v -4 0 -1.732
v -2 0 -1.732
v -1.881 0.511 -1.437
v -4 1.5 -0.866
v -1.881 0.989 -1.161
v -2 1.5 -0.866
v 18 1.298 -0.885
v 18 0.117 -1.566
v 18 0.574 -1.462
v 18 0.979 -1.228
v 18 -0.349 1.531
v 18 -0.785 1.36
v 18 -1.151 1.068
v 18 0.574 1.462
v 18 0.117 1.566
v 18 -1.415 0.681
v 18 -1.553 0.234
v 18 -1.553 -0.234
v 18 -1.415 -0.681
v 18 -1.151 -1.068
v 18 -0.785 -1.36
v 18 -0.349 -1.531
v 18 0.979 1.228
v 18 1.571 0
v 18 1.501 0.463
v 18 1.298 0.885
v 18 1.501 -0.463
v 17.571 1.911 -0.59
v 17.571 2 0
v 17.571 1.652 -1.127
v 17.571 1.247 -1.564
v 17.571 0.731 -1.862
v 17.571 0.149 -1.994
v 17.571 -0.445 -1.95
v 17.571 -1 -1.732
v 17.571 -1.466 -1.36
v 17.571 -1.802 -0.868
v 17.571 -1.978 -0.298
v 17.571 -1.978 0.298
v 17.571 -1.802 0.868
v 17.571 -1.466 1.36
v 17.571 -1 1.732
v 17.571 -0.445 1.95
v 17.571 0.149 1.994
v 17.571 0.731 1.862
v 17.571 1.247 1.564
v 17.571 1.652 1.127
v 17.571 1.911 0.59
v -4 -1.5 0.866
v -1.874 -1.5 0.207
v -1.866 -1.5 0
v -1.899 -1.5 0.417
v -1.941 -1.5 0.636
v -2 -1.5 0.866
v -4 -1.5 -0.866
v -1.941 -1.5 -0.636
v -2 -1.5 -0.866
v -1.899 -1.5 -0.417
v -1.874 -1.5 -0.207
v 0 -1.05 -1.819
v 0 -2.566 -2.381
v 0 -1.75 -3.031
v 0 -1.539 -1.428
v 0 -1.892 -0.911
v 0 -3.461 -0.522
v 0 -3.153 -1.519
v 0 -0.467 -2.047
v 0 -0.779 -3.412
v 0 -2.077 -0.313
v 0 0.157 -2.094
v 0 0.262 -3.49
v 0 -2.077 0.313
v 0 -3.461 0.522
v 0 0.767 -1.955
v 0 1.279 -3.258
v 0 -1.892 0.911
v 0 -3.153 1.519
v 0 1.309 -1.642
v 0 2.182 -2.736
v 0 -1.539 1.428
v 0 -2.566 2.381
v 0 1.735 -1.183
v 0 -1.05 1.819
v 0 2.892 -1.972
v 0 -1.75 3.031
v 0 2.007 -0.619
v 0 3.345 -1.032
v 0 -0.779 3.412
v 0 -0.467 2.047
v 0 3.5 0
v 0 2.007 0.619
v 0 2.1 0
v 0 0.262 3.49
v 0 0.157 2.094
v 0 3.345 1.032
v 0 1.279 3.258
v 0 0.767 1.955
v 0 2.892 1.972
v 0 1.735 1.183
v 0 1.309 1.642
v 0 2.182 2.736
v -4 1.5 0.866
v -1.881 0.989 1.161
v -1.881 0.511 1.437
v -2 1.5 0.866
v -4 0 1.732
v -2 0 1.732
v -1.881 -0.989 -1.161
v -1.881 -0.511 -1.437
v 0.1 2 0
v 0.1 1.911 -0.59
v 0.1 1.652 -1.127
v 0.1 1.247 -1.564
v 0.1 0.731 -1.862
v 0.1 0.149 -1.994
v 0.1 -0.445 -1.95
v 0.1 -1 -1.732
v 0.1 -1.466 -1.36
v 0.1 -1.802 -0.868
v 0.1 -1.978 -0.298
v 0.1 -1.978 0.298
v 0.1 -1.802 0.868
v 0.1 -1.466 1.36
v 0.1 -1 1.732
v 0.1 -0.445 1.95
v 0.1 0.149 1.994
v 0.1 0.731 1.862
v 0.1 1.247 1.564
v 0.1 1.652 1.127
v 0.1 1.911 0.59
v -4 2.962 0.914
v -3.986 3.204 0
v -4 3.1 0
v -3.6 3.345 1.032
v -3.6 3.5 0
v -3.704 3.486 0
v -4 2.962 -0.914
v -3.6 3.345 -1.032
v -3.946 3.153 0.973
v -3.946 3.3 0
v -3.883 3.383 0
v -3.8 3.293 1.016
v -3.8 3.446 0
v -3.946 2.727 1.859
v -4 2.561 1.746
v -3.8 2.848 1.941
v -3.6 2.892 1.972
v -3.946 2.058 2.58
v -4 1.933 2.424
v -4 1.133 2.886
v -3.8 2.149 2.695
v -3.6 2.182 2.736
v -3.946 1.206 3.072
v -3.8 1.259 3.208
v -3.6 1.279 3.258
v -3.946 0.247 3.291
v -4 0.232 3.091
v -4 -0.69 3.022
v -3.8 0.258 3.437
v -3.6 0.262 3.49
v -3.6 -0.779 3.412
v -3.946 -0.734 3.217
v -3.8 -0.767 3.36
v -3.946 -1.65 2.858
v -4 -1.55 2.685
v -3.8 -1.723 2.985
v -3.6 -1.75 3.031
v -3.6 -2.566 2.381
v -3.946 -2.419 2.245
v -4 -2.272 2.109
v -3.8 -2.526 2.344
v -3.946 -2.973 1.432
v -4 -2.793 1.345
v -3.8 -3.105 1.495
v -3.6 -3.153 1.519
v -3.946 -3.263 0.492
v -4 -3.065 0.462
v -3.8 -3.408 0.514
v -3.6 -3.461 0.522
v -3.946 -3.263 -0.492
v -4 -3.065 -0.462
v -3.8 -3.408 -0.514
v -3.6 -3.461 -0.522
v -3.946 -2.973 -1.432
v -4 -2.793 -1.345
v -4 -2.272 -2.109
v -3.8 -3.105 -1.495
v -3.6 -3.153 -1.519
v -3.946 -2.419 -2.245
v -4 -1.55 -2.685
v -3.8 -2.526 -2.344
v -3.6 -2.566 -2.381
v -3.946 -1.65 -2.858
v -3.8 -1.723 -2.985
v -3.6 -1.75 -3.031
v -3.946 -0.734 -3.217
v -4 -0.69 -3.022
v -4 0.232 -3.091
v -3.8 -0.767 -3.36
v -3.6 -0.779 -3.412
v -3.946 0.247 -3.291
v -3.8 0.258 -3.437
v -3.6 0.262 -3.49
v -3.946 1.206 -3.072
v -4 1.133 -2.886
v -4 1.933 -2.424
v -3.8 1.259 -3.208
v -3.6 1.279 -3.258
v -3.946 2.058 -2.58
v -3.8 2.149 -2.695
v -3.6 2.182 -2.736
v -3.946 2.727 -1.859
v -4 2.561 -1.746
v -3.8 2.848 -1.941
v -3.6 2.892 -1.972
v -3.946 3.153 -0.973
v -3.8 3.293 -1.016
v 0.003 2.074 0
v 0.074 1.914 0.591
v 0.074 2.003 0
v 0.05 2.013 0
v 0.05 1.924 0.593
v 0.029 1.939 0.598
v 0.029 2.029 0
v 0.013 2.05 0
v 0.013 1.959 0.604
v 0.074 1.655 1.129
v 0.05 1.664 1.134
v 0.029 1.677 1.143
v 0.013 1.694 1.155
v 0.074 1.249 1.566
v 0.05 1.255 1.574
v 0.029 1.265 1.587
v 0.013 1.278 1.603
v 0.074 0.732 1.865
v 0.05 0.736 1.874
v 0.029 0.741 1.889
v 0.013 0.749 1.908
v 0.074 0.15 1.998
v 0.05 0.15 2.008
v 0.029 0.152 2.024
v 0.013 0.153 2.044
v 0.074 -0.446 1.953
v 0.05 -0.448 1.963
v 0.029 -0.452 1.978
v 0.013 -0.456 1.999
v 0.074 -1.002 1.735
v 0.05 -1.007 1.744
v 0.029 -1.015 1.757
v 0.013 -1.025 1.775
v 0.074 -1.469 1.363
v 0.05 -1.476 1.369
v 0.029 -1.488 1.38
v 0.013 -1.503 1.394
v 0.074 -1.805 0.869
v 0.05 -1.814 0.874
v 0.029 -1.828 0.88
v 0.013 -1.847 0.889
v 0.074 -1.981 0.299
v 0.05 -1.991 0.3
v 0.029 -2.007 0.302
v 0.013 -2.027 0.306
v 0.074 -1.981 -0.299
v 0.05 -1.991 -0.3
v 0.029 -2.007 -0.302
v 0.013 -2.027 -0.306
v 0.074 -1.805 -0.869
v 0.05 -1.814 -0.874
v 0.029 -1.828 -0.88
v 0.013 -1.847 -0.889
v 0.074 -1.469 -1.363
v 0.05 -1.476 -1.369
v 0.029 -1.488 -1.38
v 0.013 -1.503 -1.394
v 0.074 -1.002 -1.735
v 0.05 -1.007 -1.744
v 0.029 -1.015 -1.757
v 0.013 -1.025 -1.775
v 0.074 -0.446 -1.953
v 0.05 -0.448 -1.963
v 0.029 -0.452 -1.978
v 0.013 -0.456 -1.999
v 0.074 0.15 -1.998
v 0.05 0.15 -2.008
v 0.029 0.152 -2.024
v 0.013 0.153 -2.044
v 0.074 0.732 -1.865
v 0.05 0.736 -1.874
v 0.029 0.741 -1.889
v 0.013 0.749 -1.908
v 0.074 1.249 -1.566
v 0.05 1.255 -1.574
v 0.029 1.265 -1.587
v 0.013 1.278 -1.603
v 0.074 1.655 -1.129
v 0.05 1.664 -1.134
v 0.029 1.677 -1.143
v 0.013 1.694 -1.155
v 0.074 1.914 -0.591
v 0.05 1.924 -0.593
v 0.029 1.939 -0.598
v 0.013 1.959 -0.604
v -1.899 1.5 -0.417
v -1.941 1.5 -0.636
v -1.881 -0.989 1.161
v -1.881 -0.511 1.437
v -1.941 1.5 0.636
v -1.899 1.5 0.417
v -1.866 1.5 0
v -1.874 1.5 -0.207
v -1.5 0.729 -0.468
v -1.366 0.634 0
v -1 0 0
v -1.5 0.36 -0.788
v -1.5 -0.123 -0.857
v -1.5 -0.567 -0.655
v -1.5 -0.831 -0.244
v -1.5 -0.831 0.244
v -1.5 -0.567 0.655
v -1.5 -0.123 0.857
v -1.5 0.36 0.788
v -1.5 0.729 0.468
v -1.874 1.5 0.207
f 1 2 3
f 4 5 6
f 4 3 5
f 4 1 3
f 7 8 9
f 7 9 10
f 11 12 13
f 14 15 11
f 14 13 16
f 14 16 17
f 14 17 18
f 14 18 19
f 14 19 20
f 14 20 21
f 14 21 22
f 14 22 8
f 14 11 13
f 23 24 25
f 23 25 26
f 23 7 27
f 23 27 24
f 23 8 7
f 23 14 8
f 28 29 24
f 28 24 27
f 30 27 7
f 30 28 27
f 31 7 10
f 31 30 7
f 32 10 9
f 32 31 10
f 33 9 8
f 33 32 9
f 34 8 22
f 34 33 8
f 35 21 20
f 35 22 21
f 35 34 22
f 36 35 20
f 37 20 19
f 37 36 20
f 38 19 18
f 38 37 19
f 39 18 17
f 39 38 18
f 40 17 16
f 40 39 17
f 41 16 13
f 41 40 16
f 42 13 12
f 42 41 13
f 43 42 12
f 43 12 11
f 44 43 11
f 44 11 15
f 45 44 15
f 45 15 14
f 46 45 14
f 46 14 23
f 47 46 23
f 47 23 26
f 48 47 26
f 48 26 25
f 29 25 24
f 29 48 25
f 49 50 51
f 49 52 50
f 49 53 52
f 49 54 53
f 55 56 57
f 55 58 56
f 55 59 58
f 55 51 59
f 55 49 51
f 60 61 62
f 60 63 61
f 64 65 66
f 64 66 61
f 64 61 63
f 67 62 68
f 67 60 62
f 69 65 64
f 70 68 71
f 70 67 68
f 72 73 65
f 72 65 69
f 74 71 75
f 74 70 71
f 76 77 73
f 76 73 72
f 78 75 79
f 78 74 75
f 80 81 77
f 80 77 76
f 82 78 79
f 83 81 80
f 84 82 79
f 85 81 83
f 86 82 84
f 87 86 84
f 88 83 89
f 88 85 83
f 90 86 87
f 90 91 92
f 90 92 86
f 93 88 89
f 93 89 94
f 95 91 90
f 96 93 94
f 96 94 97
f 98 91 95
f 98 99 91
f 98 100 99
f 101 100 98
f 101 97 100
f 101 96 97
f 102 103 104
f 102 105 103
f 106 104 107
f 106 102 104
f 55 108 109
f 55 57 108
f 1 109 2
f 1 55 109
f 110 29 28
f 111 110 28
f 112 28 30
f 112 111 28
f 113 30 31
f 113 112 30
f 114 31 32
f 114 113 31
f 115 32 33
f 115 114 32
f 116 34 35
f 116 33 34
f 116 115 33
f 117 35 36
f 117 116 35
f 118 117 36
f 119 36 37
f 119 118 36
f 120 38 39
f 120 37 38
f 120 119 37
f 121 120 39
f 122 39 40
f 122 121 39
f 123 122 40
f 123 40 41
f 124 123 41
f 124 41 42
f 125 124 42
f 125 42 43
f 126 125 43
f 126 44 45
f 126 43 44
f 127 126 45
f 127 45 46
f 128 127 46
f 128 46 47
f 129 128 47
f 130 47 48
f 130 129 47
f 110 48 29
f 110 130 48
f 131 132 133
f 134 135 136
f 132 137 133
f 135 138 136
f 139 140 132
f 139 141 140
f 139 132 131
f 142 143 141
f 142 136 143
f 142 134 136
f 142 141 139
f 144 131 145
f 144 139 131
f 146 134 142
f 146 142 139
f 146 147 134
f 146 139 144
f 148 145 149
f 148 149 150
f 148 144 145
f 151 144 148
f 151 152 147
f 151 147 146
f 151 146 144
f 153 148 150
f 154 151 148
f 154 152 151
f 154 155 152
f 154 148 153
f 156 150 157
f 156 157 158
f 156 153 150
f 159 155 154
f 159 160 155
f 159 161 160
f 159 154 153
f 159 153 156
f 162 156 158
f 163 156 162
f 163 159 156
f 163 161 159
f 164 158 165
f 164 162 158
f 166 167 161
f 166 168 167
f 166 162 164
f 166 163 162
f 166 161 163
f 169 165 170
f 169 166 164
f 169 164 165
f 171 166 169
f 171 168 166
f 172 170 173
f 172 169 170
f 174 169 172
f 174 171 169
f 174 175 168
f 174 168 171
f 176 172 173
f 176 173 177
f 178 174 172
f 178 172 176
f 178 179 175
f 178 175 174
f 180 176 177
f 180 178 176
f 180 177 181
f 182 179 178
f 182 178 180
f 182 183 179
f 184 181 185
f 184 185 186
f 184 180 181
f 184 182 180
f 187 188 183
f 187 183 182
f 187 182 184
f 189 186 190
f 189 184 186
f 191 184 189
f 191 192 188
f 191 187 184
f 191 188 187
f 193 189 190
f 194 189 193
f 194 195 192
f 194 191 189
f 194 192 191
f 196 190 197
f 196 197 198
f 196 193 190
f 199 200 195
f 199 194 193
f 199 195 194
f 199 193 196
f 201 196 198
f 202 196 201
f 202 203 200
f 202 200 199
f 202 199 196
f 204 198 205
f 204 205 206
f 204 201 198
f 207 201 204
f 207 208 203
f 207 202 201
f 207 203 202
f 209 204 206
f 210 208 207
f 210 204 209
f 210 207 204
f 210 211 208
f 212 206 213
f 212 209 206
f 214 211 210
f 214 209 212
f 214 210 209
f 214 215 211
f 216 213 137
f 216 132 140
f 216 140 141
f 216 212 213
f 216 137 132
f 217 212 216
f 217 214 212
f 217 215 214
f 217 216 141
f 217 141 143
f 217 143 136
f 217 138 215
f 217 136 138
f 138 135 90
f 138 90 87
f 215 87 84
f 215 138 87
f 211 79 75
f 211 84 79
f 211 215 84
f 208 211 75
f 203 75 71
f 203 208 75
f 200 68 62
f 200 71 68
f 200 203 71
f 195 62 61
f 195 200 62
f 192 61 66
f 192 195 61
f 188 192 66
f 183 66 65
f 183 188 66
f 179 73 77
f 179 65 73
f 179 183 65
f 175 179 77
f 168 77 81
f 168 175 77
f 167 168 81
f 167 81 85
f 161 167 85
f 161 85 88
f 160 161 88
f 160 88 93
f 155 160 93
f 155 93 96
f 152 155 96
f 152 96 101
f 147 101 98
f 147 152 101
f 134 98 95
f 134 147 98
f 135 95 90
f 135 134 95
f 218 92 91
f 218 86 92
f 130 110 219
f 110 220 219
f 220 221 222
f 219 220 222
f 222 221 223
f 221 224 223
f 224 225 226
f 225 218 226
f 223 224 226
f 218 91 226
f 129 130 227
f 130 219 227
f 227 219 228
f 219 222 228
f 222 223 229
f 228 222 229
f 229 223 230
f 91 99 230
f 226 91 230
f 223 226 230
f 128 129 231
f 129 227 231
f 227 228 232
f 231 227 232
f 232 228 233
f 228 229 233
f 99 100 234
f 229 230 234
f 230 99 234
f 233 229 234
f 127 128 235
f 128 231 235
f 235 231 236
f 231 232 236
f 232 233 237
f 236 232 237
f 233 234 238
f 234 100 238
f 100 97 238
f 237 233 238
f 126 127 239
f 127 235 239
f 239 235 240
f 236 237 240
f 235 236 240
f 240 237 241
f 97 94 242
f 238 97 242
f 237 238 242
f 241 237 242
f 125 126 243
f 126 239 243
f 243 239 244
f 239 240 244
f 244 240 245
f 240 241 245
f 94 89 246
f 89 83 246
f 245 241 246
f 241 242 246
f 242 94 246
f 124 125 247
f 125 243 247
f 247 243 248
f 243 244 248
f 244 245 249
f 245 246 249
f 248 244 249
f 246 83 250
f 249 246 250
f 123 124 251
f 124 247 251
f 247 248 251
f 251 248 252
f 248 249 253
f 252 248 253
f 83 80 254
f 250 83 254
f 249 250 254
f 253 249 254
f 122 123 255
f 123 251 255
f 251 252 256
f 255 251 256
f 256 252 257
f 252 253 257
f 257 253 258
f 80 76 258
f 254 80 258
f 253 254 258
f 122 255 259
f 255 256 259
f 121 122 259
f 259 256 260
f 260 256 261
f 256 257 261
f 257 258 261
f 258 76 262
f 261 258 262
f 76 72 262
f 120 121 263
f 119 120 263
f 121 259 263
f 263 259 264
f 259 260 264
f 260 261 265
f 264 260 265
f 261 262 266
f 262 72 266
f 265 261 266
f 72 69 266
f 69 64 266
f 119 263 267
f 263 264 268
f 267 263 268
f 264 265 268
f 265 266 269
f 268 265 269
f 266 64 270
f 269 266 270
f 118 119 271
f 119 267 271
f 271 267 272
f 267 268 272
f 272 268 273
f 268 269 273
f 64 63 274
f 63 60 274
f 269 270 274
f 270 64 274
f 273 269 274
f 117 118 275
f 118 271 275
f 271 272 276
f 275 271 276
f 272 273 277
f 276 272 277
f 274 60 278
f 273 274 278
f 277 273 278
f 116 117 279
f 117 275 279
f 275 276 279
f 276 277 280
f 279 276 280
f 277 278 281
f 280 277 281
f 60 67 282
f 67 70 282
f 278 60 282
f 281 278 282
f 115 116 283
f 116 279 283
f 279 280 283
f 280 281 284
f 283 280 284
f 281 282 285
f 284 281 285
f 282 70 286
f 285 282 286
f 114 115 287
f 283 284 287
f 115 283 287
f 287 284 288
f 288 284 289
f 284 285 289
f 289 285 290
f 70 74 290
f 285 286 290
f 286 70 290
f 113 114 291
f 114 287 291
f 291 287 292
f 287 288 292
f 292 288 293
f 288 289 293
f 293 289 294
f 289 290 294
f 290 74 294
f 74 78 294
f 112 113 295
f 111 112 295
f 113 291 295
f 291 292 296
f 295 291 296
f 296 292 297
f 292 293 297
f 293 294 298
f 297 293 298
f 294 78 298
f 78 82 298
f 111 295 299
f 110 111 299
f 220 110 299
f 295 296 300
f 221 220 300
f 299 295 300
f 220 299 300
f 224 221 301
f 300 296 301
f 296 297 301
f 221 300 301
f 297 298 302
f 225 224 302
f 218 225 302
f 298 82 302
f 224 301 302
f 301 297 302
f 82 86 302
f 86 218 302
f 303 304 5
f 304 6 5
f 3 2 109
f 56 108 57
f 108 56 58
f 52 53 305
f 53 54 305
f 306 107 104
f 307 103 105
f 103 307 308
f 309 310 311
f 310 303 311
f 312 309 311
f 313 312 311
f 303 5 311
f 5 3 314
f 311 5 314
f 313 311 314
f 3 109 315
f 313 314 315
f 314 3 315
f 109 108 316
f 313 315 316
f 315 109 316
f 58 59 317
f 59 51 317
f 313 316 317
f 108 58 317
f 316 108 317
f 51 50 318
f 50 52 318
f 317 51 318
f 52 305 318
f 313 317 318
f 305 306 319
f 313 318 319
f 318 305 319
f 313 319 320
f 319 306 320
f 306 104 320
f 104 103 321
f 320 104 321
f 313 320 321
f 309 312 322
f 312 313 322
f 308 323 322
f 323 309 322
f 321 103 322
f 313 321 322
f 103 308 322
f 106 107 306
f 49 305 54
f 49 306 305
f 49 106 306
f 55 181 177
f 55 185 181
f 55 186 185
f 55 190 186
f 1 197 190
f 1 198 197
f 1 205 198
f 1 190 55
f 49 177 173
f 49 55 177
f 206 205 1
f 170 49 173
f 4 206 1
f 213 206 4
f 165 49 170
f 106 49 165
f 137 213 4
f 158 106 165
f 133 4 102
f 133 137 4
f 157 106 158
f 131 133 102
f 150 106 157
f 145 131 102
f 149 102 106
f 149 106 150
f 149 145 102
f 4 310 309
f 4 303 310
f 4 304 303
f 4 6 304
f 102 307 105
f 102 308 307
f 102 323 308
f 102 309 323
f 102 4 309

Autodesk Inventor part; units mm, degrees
ref_plane "YZ Plane" through (0, 0, 0) normal (1, 0, 0) x (0, 1, 0)
ref_plane "XZ Plane" through (0, 0, 0) normal (0, 1, 0) x (-1, 0, 0)
sketch "Rascunho1" plane through (0, 0, 0) normal (0, 0, 1) x (1, 0, 0)
  line L0 (-1, 0) -> (18, 0)
  line L1 (18, 0) -> (18, 2)
  line L2 (18, 2) -> (0.75, 2)
  line L3 (0.75, 2) -> (0.3205, 2)
  line L4 (0.3205, 2) -> (0, 2)
  line L5 (0, 2) -> (0, 3.5)
  line L6 (0, 3.5) -> (-4, 3.5)
  line L7 (-4, 3.5) -> (-4, 1.7321)
  line L8 (-4, 1.7321) -> (-2, 1.7321)
  line L9 (-2, 1.7321) -> (-1, 0)
  line L10 (-8.4, 0) -> (22.4, 0) projected
  line L11 (0, -0.7) -> (0, 4.2) projected
  line L12 (0.75, 2) -> (0, 2) construction
  dimension "d1" = 17.25
  dimension "d2" = 0.4295
  dimension "d3" = 4
  dimension "d4" = 2
  dimension "d5" = 60
  dimension "d6" = 4
  dimension "d7" = 4
  dimension "d8" = 3.4641
  dimension "d9" = 7
  dimension "d26" = 18
revolve "Corpo" add sketch "Rascunho1" angle 360 about axis through (-1, 0, 0) along (1, 0, 0)
sketch "Rascunho2" plane through (-4, 0, 0) normal (-1, 0, 0) x (0, 0, 1)
  circle A0 centre (0, 0) radius 1.7321 projected
  line L0 (0, -4.9) -> (0, 4.9) projected
  line L1 (-4.9, 0) -> (4.9, 0) projected
  line L2 (1.7321, 0) -> (0.866, -1.5)
  line L3 (0.866, -1.5) -> (-0.866, -1.5)
  line L4 (-0.866, -1.5) -> (-1.7321, 0)
  line L5 (-1.7321, 0) -> (-0.866, 1.5)
  line L6 (-0.866, 1.5) -> (0.866, 1.5)
  line L7 (0.866, 1.5) -> (1.7321, 0)
extrude "Fenda" add sketch "Rascunho2" against normal up to next contours L7 A0 | A0 L2 | L6 L0 A0 | A0 L0 L3 | L0 L6 A0 | A0 L3 L0 | L4 A0 | A0 L5
fillet "Raio de arredondamento1" radius 0.4 1 edges at (-4, -3.5, 0)
thread "Rosca" size "M4x0.7" class "6g" standard "ISO Metric profile" length 17.25
chamfer "Chanfrar1" distance 0.4294 distance2 0.4294 1 edges at (18, -2, 0) measured on face at (18, 0.527, -0.2661)
ref_plane "Work Plane1" through (29, 0, 0) normal (0, -1, 0) x (1, 0, 0)
fillet "Fillet2" radius 0.1 1 edges at (0, -2, 0)
equation "\"d1\" = GEL"
equation "\"d3\" = KOH"
equation "\"d4\" = INTI"
equation "\"d6\" = GD"
equation "\"d7\" = BDM"
equation "\"d8\" = 1.1547 * SW"
equation "\"d9\" = KOD"
equation "\"d26\" = NLG"
equation "\"d17\" = RR"
equation "\"d13\" = GEL"
equation "\"d15\" = -0.5 * SPD + 0.5 * GD"
equation "\"d16\" = GUL"
equation "\"d30\" = R"
equation "\"GD\" = NND"
equation "\"NLG\" = 18"
equation "\"GEL\" = 17.25"
equation "\"KOD\" = 7"
equation "\"KOH\" = 4"
equation "\"INTI\" = 2"
equation "\"GAL\" = 0.61345 * PTC"
equation "\"GUL\" = 0.61345 * PTC"
equation "\"BDM\" = NND"
equation "\"SW\" = 3"
equation "\"RR\" = 0.4"
equation "\"SPD\" = NND - 1.2269 * PTC"
equation "\"R\" = 0.1"
equation "\"TOA\" = 30deg"
equation "\"GD1\" = THREADDIA - 1.2269 * PTC"
equation "\"THREADDIA\" = 4"
equation "\"FAWI\" = 45deg"
equation "\"ANG\" = 120deg"
equation "\"PTC\" = 0.7"
equation "\"NND\" = 4"
equation "\"E0\" = 1.155 * SW"
properties part number "DIN 912 M4x18" material "Aço Inox AISI 304"
